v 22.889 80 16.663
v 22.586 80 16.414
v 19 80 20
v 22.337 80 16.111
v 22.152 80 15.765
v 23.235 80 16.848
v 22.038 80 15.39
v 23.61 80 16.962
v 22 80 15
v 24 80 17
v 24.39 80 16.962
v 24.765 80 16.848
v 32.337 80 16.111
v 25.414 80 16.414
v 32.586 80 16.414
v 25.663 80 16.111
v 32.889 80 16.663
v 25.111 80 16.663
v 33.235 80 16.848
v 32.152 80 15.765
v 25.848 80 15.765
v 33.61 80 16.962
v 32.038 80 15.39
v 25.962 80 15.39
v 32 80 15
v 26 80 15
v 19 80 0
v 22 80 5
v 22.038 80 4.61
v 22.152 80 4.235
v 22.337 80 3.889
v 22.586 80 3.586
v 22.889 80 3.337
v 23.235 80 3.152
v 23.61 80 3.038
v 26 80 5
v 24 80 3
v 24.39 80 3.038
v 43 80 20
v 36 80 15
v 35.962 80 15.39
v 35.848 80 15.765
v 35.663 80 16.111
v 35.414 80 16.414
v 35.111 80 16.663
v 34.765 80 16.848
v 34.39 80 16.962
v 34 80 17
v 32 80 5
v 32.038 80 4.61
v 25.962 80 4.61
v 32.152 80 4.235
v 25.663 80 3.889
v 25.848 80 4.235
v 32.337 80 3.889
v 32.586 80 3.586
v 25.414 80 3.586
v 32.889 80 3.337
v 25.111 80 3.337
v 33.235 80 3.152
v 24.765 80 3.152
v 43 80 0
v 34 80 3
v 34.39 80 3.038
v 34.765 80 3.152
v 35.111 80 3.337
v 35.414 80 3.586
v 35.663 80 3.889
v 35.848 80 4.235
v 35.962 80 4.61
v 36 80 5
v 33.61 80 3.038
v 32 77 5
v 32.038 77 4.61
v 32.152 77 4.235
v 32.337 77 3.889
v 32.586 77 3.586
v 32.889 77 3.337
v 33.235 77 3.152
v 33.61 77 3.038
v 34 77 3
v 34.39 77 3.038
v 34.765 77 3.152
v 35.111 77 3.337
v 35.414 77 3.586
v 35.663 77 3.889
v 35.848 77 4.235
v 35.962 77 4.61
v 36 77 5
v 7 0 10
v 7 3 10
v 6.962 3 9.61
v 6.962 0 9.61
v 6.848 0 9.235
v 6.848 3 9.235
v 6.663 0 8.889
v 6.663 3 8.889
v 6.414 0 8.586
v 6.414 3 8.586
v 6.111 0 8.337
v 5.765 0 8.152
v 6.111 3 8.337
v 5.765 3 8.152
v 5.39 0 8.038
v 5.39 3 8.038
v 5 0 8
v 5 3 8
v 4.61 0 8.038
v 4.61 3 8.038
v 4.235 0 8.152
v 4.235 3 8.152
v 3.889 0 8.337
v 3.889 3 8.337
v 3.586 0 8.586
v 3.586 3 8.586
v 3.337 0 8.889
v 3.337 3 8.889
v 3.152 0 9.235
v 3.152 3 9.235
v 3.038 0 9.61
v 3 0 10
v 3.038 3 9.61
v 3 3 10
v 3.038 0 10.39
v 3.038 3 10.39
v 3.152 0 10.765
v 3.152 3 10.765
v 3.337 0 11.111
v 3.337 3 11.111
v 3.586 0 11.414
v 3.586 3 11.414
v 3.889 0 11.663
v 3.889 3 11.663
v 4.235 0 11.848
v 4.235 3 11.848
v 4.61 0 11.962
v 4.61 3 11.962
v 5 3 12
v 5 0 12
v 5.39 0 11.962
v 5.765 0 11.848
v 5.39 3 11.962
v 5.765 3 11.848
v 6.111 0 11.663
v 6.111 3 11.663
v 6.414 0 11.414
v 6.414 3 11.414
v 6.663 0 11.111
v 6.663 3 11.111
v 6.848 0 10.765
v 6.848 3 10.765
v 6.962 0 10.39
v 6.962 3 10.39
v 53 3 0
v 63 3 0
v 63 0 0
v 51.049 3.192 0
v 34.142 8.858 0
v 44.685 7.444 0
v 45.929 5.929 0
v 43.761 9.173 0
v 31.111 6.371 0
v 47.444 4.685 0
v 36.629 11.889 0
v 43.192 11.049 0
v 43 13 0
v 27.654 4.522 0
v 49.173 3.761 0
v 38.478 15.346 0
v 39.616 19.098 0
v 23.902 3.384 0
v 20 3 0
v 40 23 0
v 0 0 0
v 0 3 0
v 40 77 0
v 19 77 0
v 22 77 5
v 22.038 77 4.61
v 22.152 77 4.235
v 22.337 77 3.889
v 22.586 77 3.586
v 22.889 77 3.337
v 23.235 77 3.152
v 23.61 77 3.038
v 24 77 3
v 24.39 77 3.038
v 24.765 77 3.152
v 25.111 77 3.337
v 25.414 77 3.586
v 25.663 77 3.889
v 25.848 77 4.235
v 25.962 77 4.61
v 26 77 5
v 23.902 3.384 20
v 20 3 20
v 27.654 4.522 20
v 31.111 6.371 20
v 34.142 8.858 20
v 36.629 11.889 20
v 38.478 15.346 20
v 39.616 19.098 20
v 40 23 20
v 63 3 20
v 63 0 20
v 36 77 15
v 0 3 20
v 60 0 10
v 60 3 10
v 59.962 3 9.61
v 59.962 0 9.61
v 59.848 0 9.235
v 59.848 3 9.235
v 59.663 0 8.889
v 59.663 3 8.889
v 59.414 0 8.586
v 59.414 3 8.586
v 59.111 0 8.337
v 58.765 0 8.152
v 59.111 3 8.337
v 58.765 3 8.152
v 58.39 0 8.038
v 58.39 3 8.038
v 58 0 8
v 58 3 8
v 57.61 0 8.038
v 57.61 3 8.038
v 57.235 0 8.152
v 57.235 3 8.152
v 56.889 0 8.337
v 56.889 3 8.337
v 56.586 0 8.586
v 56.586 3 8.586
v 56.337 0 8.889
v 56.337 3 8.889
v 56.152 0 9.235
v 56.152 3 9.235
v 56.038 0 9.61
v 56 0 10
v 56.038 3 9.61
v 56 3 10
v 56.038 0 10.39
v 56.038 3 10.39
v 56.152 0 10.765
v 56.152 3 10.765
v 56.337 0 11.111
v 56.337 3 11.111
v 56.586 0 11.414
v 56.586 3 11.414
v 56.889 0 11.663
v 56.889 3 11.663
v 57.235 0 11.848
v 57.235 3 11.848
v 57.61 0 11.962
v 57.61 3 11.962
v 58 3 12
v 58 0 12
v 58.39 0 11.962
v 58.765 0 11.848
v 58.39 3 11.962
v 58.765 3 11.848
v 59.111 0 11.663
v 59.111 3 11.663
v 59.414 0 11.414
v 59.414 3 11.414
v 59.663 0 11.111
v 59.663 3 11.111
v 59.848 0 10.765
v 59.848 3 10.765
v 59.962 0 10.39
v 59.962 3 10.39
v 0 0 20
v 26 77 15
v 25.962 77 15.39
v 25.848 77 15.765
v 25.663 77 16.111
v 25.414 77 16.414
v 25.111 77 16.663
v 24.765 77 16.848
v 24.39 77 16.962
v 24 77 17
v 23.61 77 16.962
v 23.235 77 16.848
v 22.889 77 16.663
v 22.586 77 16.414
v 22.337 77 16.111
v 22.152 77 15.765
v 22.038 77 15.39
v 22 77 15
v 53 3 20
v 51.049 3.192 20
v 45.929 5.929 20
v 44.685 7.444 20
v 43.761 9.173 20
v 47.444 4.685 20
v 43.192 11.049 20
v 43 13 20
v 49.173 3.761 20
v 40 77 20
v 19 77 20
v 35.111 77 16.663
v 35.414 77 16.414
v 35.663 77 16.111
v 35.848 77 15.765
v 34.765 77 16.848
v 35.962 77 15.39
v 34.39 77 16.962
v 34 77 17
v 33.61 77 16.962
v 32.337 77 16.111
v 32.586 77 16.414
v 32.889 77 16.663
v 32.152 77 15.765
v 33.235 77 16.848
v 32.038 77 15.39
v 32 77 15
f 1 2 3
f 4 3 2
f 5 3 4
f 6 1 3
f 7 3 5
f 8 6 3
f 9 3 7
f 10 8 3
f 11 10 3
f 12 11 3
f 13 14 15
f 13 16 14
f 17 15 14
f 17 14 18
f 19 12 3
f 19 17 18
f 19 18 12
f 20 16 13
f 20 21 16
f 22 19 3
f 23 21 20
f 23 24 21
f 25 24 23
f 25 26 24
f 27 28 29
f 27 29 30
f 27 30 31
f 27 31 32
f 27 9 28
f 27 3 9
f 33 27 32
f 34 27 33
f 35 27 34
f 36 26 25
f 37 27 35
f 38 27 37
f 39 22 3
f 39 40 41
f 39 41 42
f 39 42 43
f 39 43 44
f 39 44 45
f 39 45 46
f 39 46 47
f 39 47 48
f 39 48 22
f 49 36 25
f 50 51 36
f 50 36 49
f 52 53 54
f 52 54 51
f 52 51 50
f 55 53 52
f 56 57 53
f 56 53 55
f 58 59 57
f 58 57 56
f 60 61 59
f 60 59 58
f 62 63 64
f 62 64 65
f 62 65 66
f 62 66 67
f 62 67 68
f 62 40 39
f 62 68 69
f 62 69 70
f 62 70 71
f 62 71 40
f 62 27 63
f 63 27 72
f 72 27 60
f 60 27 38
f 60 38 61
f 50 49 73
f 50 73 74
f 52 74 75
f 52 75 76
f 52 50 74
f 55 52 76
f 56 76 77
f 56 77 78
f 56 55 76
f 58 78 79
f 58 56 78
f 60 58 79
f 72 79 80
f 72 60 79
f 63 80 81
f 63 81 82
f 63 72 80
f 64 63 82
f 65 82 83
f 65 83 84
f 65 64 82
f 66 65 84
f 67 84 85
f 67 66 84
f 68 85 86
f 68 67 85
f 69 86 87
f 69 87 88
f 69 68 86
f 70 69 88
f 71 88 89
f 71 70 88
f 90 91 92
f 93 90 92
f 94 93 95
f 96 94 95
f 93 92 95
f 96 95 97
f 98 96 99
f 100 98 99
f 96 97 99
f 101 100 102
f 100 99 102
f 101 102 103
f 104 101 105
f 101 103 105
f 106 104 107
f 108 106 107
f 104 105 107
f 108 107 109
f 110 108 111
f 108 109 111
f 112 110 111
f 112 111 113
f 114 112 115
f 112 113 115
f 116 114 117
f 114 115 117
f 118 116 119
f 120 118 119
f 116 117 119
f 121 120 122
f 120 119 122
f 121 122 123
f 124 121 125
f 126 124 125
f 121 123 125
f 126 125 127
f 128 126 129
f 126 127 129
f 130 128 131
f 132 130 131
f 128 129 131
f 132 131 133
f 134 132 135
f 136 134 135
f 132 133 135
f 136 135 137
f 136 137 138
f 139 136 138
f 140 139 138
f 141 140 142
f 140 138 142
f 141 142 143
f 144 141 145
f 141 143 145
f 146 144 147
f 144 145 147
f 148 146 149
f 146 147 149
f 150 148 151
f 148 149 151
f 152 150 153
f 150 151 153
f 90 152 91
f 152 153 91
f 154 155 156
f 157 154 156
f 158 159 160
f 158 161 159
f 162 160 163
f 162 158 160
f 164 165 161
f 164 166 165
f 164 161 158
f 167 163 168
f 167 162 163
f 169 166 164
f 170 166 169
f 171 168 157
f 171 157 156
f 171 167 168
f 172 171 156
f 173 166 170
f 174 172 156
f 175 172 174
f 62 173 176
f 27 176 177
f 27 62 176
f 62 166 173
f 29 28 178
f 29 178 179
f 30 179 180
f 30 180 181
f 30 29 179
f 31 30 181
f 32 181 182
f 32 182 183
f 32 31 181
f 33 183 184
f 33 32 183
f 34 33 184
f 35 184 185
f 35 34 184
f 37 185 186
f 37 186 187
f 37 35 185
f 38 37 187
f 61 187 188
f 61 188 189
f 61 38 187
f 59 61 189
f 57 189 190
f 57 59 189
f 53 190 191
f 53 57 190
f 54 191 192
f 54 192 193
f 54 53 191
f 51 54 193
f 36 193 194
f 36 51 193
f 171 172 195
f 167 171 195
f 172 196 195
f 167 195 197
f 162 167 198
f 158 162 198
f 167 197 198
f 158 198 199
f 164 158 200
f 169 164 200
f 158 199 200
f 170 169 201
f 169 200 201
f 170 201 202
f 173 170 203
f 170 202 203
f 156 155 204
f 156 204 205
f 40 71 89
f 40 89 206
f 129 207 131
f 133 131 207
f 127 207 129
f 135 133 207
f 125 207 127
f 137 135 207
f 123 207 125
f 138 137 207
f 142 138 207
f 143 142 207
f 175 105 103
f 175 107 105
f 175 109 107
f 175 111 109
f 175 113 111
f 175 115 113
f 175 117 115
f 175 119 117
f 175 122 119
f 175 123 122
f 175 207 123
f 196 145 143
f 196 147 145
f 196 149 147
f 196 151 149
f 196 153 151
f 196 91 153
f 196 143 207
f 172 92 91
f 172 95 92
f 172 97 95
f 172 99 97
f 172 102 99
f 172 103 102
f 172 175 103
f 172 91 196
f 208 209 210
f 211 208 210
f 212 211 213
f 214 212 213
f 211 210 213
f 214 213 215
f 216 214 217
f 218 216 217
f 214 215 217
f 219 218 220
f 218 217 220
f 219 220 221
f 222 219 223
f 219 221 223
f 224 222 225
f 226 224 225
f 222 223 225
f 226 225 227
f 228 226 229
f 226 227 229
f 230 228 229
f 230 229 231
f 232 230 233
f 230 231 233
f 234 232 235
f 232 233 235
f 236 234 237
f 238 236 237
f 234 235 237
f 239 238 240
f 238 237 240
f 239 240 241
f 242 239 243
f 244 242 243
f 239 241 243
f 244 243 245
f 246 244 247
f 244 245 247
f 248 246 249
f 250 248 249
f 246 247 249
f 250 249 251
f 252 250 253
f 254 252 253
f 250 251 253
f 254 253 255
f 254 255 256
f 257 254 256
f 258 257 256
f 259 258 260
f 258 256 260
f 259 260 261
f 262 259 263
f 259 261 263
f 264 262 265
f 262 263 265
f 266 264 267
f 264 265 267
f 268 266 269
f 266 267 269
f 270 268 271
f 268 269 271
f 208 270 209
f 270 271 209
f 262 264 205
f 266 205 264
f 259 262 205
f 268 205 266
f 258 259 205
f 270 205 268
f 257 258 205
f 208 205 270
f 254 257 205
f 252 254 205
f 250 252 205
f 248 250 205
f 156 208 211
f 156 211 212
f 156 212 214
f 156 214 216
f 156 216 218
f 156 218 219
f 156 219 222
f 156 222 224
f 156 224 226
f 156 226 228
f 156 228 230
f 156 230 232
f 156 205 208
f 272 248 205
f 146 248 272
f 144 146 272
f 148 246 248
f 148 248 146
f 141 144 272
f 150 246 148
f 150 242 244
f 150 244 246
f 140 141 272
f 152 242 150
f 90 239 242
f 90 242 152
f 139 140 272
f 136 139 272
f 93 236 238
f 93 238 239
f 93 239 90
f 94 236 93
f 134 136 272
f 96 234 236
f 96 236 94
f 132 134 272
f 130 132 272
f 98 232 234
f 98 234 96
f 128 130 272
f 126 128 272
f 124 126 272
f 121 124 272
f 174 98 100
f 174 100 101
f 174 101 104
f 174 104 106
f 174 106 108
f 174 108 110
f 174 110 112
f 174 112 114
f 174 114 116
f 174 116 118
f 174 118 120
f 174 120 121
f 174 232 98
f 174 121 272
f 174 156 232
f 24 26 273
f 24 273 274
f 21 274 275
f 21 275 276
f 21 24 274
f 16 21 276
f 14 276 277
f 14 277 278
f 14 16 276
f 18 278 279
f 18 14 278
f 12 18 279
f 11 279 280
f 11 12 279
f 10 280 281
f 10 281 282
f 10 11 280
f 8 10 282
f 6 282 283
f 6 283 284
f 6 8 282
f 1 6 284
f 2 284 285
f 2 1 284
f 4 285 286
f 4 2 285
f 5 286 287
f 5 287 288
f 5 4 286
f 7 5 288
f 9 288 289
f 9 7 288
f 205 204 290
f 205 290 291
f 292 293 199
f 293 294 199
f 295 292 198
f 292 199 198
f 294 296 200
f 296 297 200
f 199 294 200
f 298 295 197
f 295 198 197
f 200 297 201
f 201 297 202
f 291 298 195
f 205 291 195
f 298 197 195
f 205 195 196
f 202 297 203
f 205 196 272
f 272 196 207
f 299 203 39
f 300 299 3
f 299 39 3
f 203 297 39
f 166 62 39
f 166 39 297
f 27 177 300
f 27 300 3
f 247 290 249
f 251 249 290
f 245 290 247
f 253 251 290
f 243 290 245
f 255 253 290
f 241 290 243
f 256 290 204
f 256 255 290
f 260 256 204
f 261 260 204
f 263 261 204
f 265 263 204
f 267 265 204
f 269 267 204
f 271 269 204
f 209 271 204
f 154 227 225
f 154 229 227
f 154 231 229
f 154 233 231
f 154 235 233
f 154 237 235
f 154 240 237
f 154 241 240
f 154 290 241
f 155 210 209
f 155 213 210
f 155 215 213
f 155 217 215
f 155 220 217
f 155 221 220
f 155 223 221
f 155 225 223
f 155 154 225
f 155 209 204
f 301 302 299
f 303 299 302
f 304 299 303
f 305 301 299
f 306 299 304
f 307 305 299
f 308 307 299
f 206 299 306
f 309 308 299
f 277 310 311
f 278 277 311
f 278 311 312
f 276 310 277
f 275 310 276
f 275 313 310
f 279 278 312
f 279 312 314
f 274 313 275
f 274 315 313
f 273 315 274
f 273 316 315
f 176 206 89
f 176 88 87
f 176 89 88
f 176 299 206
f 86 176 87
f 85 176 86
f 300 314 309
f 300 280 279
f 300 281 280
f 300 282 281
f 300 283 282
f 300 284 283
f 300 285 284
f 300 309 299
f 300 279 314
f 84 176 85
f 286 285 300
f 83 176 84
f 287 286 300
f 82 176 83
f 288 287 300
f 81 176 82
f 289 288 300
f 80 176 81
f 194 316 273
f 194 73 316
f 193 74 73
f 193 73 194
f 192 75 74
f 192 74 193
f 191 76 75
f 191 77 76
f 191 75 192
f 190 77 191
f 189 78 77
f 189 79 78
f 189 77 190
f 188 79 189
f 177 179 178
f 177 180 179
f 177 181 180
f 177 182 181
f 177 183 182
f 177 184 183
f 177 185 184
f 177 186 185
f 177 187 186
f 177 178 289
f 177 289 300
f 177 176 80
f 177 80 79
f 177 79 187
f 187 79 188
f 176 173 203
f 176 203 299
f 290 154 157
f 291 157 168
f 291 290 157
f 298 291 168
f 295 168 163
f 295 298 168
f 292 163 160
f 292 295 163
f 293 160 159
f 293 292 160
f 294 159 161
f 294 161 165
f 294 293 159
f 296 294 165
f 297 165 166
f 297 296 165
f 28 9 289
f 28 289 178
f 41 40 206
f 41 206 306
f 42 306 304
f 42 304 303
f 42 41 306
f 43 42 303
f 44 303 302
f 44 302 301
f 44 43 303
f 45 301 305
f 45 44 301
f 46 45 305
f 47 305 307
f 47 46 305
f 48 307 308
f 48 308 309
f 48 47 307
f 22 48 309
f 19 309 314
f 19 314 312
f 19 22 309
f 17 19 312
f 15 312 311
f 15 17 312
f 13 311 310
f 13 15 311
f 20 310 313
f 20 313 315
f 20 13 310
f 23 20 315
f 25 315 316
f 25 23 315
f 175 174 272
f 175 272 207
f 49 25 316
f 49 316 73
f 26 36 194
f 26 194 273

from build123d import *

# Parameters (mm, degrees)
BOSS_EXTRU_1_DEPTH      = 20
ENL_V_MAT_EXTRU_1_DEPTH = 3
CONG_1_R                = 20
CONG_2_R                = 10
ESQUISSE3_R             = 2
ENL_V_MAT_EXTRU_2_DEPTH = 3


with BuildPart() as part:
    # Esquisse1 → Boss.-Extru.1 (new body)
    with BuildSketch(Plane.XY):
        Polygon((43, 3), (63, 3), (63, 0), (0, 0), (0, 3), (40, 3), (40, 77), (19, 77), (19, 80), (43, 80), align=None)
    extrude(amount=BOSS_EXTRU_1_DEPTH)

    # Esquisse2 → Enlèv. mat.-Extru.1 (cut)
    with BuildSketch(Plane(origin=(0, 80, 0), x_dir=(1, 0, 0), z_dir=(0, 1, 0))):
        with BuildLine():
            Line((26, -5), (26, -15))
            ThreePointArc((26, -15), (24, -17), (22, -15))
            Line((22, -15), (22, -5))
            ThreePointArc((22, -5), (24, -3), (26, -5))
        make_face()
        with BuildLine():
            Line((36, -5), (36, -15))
            ThreePointArc((36, -15), (34, -17), (32, -15))
            Line((32, -15), (32, -5))
            ThreePointArc((32, -5), (34, -3), (36, -5))
        make_face()
    extrude(amount=-ENL_V_MAT_EXTRU_1_DEPTH, mode=Mode.SUBTRACT)

    # Congé1
    cong_1_edges = [part.edges().sort_by_distance(p)[0] for p in [
        (40, 3, 10),
    ]]
    fillet(cong_1_edges, radius=CONG_1_R)

    # Congé2
    cong_2_edges = [part.edges().sort_by_distance(p)[0] for p in [
        (43, 3, 10),
    ]]
    fillet(cong_2_edges, radius=CONG_2_R)

    # Esquisse3 → Enlèv. mat.-Extru.2 (cut)
    with BuildSketch(Plane(origin=(0, 3, 0), x_dir=(1, 0, 0), z_dir=(0, 1, 0))):
        with Locations((5, -10)):
            Circle(ESQUISSE3_R)
        with Locations((58, -10)):
            Circle(ESQUISSE3_R)
    extrude(amount=-ENL_V_MAT_EXTRU_2_DEPTH, mode=Mode.SUBTRACT)


solid = part.part
